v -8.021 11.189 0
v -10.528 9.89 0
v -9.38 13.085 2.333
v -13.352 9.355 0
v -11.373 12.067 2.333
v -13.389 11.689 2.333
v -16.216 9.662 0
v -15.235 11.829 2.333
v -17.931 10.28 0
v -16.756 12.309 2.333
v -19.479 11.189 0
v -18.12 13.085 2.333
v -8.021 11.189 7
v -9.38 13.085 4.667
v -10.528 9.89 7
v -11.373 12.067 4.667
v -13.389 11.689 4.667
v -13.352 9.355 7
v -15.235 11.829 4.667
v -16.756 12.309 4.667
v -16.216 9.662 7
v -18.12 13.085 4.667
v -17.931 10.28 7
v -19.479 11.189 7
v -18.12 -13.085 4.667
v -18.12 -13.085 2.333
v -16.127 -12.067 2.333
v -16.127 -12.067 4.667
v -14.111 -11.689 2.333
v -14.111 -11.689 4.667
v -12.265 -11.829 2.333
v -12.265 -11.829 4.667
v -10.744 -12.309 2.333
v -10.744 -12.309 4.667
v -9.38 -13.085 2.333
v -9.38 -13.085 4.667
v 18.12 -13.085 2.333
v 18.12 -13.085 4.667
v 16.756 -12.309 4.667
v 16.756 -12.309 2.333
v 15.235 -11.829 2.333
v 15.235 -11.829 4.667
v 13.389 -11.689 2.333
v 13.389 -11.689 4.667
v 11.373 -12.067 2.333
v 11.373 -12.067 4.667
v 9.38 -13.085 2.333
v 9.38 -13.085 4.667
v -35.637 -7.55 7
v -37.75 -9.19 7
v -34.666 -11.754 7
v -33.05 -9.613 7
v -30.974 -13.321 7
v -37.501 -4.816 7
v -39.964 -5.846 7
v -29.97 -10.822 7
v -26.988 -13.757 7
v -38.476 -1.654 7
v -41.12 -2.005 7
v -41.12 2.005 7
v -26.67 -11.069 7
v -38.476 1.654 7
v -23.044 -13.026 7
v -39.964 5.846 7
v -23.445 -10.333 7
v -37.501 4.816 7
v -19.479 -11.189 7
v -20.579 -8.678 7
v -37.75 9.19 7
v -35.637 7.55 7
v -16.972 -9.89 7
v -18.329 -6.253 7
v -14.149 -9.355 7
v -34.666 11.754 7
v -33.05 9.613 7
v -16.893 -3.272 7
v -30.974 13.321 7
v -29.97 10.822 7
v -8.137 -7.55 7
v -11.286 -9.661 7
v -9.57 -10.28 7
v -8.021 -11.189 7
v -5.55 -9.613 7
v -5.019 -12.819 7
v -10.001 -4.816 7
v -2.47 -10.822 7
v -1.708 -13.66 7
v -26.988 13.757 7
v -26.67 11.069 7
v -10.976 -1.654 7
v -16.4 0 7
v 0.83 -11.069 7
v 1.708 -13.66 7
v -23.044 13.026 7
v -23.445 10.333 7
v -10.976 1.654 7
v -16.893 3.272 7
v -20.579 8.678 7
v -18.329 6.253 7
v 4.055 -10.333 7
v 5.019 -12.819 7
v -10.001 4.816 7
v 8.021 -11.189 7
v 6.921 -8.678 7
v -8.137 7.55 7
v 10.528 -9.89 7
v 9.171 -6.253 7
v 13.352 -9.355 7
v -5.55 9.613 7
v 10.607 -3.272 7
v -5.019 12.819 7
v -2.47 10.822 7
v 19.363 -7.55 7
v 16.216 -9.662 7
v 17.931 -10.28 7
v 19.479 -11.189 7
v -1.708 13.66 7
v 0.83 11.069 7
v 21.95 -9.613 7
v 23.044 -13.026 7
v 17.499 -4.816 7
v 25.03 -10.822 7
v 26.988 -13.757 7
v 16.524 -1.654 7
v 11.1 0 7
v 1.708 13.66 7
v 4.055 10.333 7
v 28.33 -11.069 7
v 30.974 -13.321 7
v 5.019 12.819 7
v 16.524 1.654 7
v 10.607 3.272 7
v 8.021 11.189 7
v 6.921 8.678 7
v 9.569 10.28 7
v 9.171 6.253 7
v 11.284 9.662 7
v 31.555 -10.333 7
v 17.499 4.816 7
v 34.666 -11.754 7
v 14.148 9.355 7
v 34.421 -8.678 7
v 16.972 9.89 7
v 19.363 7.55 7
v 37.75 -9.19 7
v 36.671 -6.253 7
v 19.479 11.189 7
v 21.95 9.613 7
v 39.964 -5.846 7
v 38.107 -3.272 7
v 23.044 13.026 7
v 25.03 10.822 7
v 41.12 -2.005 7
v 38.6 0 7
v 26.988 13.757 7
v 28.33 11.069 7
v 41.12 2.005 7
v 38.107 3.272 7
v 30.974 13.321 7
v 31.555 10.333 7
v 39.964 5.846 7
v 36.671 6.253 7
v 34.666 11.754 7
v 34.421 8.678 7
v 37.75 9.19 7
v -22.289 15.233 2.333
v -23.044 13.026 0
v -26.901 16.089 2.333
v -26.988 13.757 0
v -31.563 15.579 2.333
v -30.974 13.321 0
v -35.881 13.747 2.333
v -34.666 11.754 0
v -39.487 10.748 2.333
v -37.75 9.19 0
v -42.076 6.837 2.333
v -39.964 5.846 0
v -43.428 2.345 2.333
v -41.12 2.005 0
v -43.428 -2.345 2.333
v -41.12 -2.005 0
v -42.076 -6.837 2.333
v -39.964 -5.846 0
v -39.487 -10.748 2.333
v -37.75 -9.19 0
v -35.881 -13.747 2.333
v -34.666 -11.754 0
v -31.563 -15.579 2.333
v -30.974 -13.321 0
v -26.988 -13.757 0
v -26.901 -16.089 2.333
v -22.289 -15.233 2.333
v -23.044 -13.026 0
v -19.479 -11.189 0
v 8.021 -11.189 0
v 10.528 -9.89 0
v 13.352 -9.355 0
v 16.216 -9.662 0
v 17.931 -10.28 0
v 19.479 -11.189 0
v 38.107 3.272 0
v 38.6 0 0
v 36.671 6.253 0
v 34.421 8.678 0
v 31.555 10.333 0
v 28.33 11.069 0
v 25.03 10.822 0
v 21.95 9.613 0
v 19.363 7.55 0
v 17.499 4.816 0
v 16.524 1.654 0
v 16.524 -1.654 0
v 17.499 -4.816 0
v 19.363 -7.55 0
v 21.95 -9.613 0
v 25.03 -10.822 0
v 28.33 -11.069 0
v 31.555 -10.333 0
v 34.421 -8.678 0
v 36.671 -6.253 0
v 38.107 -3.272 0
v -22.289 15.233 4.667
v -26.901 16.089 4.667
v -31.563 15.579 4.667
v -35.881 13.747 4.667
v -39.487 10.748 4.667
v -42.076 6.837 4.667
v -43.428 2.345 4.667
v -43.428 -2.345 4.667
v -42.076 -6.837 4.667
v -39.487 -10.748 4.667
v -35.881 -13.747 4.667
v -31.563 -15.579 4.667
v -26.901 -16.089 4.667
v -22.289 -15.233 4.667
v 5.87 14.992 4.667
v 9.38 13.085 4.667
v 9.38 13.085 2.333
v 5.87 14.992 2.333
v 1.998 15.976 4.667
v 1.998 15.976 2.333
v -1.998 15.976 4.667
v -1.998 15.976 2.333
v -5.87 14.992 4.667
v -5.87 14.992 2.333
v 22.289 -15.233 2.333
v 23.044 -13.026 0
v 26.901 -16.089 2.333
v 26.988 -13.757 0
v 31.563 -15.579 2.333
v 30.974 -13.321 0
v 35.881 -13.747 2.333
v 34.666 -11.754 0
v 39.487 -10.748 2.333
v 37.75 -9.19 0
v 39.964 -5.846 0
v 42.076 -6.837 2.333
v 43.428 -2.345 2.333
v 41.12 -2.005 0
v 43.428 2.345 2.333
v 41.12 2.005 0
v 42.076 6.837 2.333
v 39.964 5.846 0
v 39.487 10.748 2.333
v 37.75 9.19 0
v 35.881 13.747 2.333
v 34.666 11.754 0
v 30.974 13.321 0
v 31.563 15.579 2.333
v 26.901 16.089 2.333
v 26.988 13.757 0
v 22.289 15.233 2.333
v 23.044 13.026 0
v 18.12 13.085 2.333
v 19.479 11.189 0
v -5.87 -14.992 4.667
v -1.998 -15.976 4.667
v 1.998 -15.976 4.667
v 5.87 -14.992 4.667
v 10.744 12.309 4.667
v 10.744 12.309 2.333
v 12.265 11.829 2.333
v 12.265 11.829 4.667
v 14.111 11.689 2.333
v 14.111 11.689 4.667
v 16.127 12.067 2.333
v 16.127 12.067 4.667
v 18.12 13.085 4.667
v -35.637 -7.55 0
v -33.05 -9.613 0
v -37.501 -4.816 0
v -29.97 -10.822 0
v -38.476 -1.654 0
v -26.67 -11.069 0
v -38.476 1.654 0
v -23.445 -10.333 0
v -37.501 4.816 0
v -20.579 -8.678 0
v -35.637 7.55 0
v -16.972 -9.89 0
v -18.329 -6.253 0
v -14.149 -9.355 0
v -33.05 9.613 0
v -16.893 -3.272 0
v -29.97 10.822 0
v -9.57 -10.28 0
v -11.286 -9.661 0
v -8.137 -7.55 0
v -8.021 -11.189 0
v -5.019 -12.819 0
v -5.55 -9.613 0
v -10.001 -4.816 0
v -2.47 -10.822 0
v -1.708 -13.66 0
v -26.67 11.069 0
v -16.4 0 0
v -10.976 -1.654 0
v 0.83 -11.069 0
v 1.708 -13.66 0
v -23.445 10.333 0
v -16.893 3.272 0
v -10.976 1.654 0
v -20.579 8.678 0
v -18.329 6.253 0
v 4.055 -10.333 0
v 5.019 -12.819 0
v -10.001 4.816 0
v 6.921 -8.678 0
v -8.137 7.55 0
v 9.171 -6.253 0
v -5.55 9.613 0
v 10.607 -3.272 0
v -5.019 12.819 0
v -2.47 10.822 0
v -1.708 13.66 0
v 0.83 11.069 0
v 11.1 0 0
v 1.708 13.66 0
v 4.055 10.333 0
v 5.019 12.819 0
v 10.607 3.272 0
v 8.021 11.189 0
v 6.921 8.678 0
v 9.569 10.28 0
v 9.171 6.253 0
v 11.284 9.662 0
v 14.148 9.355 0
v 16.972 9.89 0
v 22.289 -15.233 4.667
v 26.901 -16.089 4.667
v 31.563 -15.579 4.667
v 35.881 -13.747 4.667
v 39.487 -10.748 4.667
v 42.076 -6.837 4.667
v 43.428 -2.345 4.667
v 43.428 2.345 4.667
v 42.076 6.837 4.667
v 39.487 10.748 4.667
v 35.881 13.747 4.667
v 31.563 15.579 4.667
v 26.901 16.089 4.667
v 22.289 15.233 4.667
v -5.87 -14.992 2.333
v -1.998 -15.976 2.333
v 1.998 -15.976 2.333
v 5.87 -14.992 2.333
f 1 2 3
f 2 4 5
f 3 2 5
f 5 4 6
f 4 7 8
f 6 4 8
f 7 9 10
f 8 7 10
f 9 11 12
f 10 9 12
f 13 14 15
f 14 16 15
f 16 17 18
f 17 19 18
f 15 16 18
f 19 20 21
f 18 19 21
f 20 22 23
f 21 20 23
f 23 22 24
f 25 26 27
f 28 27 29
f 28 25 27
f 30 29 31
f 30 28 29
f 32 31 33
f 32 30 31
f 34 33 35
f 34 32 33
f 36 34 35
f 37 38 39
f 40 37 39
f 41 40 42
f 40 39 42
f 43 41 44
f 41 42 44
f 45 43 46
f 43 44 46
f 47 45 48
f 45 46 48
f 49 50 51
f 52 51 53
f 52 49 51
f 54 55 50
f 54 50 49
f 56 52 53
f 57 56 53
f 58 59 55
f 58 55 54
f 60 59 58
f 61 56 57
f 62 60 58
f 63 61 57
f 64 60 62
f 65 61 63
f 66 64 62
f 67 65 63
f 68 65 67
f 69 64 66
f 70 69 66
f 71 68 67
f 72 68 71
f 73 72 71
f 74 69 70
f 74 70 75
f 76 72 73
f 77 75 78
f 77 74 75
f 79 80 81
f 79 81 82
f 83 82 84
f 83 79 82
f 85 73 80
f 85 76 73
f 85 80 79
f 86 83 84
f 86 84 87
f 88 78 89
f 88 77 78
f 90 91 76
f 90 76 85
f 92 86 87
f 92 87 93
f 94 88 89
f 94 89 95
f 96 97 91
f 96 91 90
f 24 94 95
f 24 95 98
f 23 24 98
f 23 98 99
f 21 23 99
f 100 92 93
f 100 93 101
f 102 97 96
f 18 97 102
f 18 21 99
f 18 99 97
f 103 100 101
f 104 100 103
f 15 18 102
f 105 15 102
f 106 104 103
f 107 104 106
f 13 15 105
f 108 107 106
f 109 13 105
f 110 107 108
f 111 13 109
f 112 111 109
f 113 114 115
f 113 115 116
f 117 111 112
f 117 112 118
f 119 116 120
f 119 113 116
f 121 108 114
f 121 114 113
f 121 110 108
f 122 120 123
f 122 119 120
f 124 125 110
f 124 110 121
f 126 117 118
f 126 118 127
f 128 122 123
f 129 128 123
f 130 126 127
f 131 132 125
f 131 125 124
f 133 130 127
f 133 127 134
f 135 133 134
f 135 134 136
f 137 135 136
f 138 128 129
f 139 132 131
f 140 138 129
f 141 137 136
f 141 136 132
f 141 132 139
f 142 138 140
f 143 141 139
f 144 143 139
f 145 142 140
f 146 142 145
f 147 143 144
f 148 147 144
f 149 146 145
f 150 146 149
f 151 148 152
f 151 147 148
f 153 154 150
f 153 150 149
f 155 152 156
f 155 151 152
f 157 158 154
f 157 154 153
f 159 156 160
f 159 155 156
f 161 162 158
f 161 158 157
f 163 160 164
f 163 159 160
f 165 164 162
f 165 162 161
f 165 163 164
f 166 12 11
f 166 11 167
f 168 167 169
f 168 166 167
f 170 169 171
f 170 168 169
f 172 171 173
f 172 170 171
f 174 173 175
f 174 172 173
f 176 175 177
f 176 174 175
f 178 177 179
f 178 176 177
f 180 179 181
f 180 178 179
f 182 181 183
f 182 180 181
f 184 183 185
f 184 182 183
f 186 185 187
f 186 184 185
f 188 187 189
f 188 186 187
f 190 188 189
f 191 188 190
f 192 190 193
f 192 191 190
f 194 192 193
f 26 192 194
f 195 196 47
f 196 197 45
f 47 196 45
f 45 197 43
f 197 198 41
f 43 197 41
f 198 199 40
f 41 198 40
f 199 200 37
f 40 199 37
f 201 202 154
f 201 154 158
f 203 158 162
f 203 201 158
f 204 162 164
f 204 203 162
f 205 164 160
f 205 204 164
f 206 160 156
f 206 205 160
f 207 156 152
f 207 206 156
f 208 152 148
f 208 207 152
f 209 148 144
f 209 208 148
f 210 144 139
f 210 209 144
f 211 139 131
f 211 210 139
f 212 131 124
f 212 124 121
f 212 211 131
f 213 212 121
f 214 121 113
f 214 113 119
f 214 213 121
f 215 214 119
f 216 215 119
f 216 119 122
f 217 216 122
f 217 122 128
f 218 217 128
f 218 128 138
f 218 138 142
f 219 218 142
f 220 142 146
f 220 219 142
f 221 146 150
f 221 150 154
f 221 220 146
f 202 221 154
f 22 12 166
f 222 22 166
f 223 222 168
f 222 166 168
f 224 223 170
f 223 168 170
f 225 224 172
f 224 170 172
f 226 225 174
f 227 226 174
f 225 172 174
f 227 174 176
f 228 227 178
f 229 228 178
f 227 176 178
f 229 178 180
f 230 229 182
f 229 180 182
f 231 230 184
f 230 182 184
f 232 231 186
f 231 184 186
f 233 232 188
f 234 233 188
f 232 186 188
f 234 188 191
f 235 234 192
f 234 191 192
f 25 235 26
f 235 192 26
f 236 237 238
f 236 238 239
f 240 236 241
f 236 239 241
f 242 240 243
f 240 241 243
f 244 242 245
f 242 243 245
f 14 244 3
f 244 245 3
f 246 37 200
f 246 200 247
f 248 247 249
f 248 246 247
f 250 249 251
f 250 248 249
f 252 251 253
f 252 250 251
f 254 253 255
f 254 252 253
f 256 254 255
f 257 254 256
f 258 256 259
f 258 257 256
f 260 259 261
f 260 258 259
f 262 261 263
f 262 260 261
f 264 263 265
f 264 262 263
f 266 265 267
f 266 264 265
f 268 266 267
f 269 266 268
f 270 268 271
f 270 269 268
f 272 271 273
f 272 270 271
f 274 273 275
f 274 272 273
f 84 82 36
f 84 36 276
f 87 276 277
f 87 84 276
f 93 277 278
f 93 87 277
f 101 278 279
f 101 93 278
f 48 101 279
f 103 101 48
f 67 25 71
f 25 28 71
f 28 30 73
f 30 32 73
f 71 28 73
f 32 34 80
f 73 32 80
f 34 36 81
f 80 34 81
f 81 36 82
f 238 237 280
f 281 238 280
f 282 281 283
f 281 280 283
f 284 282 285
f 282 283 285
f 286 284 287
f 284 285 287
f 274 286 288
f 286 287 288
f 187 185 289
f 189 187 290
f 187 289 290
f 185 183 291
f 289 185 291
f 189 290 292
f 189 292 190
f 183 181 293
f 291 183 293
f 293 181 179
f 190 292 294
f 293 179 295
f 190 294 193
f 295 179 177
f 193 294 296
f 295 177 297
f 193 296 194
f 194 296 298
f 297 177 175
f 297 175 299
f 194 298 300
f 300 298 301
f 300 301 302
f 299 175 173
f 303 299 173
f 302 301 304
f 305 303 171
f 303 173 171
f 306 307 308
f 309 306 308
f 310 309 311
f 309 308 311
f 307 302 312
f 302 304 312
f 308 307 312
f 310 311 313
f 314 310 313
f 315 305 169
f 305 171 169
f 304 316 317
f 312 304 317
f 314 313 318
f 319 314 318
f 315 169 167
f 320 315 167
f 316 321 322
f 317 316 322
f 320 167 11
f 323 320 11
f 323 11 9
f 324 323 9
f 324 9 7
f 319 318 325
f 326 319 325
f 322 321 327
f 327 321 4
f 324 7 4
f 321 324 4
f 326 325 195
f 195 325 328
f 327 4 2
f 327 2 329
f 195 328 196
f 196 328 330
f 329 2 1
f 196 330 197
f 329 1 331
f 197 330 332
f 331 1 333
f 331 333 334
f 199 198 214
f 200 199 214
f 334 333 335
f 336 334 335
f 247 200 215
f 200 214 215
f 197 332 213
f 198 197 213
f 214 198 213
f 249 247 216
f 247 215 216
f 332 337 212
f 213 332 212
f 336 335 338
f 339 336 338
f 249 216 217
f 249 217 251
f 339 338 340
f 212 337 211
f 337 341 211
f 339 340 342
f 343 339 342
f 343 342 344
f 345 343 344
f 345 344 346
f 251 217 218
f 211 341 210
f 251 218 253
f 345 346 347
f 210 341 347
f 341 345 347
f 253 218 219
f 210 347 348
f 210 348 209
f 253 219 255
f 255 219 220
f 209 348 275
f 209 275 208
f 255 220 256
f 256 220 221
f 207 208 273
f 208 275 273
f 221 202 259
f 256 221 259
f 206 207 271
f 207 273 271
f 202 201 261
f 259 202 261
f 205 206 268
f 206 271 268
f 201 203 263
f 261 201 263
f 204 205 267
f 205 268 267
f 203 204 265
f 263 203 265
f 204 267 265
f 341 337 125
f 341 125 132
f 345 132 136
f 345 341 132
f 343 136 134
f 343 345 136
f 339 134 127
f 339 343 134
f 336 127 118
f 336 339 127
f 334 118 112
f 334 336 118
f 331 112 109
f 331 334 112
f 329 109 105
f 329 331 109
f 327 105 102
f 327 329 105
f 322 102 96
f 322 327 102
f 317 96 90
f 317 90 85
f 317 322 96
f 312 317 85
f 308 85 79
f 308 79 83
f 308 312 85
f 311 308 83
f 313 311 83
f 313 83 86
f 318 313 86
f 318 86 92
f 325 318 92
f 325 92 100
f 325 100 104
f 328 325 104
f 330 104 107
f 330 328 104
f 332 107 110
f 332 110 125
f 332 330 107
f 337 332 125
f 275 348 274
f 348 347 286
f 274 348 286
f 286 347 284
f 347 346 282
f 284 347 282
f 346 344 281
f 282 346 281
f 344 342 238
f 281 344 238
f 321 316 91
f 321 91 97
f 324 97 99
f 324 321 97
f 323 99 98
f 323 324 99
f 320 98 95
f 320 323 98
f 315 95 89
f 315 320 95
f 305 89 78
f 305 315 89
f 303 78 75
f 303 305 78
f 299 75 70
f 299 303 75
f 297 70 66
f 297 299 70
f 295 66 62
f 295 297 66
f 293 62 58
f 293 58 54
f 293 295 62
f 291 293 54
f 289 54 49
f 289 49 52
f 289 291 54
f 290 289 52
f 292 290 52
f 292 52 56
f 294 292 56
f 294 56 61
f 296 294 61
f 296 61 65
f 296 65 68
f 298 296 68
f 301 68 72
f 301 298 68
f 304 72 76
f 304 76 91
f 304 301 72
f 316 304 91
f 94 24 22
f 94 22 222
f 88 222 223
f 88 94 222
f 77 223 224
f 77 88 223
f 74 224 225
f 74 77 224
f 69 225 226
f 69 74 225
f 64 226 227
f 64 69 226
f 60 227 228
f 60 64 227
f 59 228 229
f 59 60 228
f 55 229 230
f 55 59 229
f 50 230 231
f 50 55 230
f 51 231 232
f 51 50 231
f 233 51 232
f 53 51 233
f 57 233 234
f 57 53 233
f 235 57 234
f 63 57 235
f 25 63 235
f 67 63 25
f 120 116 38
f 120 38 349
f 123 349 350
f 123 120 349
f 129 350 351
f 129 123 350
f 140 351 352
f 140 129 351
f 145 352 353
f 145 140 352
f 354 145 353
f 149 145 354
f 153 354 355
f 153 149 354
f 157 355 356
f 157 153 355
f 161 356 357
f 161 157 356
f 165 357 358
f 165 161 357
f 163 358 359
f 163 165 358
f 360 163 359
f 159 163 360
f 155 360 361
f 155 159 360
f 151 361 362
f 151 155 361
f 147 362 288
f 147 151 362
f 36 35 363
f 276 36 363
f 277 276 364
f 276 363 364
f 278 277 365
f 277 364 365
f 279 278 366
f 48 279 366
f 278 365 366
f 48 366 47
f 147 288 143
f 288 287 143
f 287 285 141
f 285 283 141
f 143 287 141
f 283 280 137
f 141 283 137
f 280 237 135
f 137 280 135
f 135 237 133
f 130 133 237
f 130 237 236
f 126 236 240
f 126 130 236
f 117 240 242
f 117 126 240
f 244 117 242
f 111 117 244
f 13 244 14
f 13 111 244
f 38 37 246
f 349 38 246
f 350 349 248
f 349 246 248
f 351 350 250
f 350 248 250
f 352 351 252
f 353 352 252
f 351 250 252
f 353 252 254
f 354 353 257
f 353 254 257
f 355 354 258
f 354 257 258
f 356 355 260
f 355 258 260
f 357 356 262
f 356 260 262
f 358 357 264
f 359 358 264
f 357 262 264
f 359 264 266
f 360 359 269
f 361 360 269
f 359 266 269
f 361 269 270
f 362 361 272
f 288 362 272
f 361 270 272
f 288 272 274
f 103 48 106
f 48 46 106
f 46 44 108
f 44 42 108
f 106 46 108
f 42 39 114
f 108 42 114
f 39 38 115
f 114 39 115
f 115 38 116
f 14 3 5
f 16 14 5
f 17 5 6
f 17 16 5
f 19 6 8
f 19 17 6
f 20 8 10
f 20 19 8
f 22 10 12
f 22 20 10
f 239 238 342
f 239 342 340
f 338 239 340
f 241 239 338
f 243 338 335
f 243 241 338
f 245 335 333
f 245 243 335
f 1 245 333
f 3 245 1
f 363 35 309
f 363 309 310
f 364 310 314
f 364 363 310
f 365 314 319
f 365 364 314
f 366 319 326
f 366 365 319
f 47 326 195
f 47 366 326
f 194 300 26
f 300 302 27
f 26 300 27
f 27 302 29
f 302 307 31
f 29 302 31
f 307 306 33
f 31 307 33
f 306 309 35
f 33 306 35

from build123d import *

# Parameters (mm, degrees)
F0_R     = 11.1
F1_DEPTH = 7
F2_R     = 7.5
F3_SIZE  = 2.3333333333


with BuildPart() as f1:
    # F0 (on Top) → F1 (new body)
    with BuildSketch(Plane.XY):
        with BuildLine():
            ThreePointArc((13.75, -8.3754104377), (15.5013709071, -4.3494252494), (16.1, 0))
            ThreePointArc((16.1, 0), (15.5013709071, 4.3494252494), (13.75, 8.3754104377))
            ThreePointArc((13.75, 8.3754104377), (11.4, 0), (13.75, -8.3754104377))
        make_face()
        with BuildLine():
            ThreePointArc((13.75, 8.3754104377), (15.5013709071, 4.3494252494), (16.1, 0))
            ThreePointArc((16.1, 0), (15.5013709071, -4.3494252494), (13.75, -8.3754104377))
            ThreePointArc((13.75, -8.3754104377), (31.8494252494, -15.5013709071), (43.6, 0))
            ThreePointArc((43.6, 0), (31.8494252494, 15.5013709071), (13.75, 8.3754104377))
        make_face()
        with Locations((27.5, 0)):
            Circle(F0_R, mode=Mode.SUBTRACT)
        with BuildLine():
            ThreePointArc((13.75, -8.3754104377), (11.4, 0), (13.75, 8.3754104377))
            ThreePointArc((13.75, 8.3754104377), (0, 16.1), (-13.75, 8.3754104377))
            ThreePointArc((-13.75, 8.3754104377), (-11.9986290929, 4.3494252494), (-11.4, 0))
            ThreePointArc((-11.4, 0), (-11.9986290929, -4.3494252494), (-13.75, -8.3754104377))
            ThreePointArc((-13.75, -8.3754104377), (0, -16.1), (13.75, -8.3754104377))
        make_face()
        Circle(F0_R, mode=Mode.SUBTRACT)
        with BuildLine():
            ThreePointArc((-11.4, 0), (-11.9986290929, 4.3494252494), (-13.75, 8.3754104377))
            ThreePointArc((-13.75, 8.3754104377), (-16.1, 0), (-13.75, -8.3754104377))
            ThreePointArc((-13.75, -8.3754104377), (-11.9986290929, -4.3494252494), (-11.4, 0))
        make_face()
        with BuildLine():
            ThreePointArc((-13.75, -8.3754104377), (-16.1, 0), (-13.75, 8.3754104377))
            ThreePointArc((-13.75, 8.3754104377), (-43.6, 0), (-13.75, -8.3754104377))
        make_face()
        with Locations((-27.5, 0)):
            Circle(F0_R, mode=Mode.SUBTRACT)
    extrude(amount=F1_DEPTH)

    # F2
    f2_edges = [f1.edges().sort_by_distance(p)[0] for p in [
        (-13.75, 8.37541, 3.5),
        (13.75, 8.37541, 3.5),
        (-13.75, -8.37541, 3.5),
        (13.75, -8.37541, 3.5),
    ]]
    fillet(f2_edges, radius=F2_R)

    # F3
    f3_edges = [f1.edges().sort_by_distance(p)[0] for p in [
        (0, 16.1, 7),
        (-13.75, 11.680654, 7),
        (-43.6, 0, 0),
    ]]
    chamfer(f3_edges, length=F3_SIZE)


solid = f1.part
